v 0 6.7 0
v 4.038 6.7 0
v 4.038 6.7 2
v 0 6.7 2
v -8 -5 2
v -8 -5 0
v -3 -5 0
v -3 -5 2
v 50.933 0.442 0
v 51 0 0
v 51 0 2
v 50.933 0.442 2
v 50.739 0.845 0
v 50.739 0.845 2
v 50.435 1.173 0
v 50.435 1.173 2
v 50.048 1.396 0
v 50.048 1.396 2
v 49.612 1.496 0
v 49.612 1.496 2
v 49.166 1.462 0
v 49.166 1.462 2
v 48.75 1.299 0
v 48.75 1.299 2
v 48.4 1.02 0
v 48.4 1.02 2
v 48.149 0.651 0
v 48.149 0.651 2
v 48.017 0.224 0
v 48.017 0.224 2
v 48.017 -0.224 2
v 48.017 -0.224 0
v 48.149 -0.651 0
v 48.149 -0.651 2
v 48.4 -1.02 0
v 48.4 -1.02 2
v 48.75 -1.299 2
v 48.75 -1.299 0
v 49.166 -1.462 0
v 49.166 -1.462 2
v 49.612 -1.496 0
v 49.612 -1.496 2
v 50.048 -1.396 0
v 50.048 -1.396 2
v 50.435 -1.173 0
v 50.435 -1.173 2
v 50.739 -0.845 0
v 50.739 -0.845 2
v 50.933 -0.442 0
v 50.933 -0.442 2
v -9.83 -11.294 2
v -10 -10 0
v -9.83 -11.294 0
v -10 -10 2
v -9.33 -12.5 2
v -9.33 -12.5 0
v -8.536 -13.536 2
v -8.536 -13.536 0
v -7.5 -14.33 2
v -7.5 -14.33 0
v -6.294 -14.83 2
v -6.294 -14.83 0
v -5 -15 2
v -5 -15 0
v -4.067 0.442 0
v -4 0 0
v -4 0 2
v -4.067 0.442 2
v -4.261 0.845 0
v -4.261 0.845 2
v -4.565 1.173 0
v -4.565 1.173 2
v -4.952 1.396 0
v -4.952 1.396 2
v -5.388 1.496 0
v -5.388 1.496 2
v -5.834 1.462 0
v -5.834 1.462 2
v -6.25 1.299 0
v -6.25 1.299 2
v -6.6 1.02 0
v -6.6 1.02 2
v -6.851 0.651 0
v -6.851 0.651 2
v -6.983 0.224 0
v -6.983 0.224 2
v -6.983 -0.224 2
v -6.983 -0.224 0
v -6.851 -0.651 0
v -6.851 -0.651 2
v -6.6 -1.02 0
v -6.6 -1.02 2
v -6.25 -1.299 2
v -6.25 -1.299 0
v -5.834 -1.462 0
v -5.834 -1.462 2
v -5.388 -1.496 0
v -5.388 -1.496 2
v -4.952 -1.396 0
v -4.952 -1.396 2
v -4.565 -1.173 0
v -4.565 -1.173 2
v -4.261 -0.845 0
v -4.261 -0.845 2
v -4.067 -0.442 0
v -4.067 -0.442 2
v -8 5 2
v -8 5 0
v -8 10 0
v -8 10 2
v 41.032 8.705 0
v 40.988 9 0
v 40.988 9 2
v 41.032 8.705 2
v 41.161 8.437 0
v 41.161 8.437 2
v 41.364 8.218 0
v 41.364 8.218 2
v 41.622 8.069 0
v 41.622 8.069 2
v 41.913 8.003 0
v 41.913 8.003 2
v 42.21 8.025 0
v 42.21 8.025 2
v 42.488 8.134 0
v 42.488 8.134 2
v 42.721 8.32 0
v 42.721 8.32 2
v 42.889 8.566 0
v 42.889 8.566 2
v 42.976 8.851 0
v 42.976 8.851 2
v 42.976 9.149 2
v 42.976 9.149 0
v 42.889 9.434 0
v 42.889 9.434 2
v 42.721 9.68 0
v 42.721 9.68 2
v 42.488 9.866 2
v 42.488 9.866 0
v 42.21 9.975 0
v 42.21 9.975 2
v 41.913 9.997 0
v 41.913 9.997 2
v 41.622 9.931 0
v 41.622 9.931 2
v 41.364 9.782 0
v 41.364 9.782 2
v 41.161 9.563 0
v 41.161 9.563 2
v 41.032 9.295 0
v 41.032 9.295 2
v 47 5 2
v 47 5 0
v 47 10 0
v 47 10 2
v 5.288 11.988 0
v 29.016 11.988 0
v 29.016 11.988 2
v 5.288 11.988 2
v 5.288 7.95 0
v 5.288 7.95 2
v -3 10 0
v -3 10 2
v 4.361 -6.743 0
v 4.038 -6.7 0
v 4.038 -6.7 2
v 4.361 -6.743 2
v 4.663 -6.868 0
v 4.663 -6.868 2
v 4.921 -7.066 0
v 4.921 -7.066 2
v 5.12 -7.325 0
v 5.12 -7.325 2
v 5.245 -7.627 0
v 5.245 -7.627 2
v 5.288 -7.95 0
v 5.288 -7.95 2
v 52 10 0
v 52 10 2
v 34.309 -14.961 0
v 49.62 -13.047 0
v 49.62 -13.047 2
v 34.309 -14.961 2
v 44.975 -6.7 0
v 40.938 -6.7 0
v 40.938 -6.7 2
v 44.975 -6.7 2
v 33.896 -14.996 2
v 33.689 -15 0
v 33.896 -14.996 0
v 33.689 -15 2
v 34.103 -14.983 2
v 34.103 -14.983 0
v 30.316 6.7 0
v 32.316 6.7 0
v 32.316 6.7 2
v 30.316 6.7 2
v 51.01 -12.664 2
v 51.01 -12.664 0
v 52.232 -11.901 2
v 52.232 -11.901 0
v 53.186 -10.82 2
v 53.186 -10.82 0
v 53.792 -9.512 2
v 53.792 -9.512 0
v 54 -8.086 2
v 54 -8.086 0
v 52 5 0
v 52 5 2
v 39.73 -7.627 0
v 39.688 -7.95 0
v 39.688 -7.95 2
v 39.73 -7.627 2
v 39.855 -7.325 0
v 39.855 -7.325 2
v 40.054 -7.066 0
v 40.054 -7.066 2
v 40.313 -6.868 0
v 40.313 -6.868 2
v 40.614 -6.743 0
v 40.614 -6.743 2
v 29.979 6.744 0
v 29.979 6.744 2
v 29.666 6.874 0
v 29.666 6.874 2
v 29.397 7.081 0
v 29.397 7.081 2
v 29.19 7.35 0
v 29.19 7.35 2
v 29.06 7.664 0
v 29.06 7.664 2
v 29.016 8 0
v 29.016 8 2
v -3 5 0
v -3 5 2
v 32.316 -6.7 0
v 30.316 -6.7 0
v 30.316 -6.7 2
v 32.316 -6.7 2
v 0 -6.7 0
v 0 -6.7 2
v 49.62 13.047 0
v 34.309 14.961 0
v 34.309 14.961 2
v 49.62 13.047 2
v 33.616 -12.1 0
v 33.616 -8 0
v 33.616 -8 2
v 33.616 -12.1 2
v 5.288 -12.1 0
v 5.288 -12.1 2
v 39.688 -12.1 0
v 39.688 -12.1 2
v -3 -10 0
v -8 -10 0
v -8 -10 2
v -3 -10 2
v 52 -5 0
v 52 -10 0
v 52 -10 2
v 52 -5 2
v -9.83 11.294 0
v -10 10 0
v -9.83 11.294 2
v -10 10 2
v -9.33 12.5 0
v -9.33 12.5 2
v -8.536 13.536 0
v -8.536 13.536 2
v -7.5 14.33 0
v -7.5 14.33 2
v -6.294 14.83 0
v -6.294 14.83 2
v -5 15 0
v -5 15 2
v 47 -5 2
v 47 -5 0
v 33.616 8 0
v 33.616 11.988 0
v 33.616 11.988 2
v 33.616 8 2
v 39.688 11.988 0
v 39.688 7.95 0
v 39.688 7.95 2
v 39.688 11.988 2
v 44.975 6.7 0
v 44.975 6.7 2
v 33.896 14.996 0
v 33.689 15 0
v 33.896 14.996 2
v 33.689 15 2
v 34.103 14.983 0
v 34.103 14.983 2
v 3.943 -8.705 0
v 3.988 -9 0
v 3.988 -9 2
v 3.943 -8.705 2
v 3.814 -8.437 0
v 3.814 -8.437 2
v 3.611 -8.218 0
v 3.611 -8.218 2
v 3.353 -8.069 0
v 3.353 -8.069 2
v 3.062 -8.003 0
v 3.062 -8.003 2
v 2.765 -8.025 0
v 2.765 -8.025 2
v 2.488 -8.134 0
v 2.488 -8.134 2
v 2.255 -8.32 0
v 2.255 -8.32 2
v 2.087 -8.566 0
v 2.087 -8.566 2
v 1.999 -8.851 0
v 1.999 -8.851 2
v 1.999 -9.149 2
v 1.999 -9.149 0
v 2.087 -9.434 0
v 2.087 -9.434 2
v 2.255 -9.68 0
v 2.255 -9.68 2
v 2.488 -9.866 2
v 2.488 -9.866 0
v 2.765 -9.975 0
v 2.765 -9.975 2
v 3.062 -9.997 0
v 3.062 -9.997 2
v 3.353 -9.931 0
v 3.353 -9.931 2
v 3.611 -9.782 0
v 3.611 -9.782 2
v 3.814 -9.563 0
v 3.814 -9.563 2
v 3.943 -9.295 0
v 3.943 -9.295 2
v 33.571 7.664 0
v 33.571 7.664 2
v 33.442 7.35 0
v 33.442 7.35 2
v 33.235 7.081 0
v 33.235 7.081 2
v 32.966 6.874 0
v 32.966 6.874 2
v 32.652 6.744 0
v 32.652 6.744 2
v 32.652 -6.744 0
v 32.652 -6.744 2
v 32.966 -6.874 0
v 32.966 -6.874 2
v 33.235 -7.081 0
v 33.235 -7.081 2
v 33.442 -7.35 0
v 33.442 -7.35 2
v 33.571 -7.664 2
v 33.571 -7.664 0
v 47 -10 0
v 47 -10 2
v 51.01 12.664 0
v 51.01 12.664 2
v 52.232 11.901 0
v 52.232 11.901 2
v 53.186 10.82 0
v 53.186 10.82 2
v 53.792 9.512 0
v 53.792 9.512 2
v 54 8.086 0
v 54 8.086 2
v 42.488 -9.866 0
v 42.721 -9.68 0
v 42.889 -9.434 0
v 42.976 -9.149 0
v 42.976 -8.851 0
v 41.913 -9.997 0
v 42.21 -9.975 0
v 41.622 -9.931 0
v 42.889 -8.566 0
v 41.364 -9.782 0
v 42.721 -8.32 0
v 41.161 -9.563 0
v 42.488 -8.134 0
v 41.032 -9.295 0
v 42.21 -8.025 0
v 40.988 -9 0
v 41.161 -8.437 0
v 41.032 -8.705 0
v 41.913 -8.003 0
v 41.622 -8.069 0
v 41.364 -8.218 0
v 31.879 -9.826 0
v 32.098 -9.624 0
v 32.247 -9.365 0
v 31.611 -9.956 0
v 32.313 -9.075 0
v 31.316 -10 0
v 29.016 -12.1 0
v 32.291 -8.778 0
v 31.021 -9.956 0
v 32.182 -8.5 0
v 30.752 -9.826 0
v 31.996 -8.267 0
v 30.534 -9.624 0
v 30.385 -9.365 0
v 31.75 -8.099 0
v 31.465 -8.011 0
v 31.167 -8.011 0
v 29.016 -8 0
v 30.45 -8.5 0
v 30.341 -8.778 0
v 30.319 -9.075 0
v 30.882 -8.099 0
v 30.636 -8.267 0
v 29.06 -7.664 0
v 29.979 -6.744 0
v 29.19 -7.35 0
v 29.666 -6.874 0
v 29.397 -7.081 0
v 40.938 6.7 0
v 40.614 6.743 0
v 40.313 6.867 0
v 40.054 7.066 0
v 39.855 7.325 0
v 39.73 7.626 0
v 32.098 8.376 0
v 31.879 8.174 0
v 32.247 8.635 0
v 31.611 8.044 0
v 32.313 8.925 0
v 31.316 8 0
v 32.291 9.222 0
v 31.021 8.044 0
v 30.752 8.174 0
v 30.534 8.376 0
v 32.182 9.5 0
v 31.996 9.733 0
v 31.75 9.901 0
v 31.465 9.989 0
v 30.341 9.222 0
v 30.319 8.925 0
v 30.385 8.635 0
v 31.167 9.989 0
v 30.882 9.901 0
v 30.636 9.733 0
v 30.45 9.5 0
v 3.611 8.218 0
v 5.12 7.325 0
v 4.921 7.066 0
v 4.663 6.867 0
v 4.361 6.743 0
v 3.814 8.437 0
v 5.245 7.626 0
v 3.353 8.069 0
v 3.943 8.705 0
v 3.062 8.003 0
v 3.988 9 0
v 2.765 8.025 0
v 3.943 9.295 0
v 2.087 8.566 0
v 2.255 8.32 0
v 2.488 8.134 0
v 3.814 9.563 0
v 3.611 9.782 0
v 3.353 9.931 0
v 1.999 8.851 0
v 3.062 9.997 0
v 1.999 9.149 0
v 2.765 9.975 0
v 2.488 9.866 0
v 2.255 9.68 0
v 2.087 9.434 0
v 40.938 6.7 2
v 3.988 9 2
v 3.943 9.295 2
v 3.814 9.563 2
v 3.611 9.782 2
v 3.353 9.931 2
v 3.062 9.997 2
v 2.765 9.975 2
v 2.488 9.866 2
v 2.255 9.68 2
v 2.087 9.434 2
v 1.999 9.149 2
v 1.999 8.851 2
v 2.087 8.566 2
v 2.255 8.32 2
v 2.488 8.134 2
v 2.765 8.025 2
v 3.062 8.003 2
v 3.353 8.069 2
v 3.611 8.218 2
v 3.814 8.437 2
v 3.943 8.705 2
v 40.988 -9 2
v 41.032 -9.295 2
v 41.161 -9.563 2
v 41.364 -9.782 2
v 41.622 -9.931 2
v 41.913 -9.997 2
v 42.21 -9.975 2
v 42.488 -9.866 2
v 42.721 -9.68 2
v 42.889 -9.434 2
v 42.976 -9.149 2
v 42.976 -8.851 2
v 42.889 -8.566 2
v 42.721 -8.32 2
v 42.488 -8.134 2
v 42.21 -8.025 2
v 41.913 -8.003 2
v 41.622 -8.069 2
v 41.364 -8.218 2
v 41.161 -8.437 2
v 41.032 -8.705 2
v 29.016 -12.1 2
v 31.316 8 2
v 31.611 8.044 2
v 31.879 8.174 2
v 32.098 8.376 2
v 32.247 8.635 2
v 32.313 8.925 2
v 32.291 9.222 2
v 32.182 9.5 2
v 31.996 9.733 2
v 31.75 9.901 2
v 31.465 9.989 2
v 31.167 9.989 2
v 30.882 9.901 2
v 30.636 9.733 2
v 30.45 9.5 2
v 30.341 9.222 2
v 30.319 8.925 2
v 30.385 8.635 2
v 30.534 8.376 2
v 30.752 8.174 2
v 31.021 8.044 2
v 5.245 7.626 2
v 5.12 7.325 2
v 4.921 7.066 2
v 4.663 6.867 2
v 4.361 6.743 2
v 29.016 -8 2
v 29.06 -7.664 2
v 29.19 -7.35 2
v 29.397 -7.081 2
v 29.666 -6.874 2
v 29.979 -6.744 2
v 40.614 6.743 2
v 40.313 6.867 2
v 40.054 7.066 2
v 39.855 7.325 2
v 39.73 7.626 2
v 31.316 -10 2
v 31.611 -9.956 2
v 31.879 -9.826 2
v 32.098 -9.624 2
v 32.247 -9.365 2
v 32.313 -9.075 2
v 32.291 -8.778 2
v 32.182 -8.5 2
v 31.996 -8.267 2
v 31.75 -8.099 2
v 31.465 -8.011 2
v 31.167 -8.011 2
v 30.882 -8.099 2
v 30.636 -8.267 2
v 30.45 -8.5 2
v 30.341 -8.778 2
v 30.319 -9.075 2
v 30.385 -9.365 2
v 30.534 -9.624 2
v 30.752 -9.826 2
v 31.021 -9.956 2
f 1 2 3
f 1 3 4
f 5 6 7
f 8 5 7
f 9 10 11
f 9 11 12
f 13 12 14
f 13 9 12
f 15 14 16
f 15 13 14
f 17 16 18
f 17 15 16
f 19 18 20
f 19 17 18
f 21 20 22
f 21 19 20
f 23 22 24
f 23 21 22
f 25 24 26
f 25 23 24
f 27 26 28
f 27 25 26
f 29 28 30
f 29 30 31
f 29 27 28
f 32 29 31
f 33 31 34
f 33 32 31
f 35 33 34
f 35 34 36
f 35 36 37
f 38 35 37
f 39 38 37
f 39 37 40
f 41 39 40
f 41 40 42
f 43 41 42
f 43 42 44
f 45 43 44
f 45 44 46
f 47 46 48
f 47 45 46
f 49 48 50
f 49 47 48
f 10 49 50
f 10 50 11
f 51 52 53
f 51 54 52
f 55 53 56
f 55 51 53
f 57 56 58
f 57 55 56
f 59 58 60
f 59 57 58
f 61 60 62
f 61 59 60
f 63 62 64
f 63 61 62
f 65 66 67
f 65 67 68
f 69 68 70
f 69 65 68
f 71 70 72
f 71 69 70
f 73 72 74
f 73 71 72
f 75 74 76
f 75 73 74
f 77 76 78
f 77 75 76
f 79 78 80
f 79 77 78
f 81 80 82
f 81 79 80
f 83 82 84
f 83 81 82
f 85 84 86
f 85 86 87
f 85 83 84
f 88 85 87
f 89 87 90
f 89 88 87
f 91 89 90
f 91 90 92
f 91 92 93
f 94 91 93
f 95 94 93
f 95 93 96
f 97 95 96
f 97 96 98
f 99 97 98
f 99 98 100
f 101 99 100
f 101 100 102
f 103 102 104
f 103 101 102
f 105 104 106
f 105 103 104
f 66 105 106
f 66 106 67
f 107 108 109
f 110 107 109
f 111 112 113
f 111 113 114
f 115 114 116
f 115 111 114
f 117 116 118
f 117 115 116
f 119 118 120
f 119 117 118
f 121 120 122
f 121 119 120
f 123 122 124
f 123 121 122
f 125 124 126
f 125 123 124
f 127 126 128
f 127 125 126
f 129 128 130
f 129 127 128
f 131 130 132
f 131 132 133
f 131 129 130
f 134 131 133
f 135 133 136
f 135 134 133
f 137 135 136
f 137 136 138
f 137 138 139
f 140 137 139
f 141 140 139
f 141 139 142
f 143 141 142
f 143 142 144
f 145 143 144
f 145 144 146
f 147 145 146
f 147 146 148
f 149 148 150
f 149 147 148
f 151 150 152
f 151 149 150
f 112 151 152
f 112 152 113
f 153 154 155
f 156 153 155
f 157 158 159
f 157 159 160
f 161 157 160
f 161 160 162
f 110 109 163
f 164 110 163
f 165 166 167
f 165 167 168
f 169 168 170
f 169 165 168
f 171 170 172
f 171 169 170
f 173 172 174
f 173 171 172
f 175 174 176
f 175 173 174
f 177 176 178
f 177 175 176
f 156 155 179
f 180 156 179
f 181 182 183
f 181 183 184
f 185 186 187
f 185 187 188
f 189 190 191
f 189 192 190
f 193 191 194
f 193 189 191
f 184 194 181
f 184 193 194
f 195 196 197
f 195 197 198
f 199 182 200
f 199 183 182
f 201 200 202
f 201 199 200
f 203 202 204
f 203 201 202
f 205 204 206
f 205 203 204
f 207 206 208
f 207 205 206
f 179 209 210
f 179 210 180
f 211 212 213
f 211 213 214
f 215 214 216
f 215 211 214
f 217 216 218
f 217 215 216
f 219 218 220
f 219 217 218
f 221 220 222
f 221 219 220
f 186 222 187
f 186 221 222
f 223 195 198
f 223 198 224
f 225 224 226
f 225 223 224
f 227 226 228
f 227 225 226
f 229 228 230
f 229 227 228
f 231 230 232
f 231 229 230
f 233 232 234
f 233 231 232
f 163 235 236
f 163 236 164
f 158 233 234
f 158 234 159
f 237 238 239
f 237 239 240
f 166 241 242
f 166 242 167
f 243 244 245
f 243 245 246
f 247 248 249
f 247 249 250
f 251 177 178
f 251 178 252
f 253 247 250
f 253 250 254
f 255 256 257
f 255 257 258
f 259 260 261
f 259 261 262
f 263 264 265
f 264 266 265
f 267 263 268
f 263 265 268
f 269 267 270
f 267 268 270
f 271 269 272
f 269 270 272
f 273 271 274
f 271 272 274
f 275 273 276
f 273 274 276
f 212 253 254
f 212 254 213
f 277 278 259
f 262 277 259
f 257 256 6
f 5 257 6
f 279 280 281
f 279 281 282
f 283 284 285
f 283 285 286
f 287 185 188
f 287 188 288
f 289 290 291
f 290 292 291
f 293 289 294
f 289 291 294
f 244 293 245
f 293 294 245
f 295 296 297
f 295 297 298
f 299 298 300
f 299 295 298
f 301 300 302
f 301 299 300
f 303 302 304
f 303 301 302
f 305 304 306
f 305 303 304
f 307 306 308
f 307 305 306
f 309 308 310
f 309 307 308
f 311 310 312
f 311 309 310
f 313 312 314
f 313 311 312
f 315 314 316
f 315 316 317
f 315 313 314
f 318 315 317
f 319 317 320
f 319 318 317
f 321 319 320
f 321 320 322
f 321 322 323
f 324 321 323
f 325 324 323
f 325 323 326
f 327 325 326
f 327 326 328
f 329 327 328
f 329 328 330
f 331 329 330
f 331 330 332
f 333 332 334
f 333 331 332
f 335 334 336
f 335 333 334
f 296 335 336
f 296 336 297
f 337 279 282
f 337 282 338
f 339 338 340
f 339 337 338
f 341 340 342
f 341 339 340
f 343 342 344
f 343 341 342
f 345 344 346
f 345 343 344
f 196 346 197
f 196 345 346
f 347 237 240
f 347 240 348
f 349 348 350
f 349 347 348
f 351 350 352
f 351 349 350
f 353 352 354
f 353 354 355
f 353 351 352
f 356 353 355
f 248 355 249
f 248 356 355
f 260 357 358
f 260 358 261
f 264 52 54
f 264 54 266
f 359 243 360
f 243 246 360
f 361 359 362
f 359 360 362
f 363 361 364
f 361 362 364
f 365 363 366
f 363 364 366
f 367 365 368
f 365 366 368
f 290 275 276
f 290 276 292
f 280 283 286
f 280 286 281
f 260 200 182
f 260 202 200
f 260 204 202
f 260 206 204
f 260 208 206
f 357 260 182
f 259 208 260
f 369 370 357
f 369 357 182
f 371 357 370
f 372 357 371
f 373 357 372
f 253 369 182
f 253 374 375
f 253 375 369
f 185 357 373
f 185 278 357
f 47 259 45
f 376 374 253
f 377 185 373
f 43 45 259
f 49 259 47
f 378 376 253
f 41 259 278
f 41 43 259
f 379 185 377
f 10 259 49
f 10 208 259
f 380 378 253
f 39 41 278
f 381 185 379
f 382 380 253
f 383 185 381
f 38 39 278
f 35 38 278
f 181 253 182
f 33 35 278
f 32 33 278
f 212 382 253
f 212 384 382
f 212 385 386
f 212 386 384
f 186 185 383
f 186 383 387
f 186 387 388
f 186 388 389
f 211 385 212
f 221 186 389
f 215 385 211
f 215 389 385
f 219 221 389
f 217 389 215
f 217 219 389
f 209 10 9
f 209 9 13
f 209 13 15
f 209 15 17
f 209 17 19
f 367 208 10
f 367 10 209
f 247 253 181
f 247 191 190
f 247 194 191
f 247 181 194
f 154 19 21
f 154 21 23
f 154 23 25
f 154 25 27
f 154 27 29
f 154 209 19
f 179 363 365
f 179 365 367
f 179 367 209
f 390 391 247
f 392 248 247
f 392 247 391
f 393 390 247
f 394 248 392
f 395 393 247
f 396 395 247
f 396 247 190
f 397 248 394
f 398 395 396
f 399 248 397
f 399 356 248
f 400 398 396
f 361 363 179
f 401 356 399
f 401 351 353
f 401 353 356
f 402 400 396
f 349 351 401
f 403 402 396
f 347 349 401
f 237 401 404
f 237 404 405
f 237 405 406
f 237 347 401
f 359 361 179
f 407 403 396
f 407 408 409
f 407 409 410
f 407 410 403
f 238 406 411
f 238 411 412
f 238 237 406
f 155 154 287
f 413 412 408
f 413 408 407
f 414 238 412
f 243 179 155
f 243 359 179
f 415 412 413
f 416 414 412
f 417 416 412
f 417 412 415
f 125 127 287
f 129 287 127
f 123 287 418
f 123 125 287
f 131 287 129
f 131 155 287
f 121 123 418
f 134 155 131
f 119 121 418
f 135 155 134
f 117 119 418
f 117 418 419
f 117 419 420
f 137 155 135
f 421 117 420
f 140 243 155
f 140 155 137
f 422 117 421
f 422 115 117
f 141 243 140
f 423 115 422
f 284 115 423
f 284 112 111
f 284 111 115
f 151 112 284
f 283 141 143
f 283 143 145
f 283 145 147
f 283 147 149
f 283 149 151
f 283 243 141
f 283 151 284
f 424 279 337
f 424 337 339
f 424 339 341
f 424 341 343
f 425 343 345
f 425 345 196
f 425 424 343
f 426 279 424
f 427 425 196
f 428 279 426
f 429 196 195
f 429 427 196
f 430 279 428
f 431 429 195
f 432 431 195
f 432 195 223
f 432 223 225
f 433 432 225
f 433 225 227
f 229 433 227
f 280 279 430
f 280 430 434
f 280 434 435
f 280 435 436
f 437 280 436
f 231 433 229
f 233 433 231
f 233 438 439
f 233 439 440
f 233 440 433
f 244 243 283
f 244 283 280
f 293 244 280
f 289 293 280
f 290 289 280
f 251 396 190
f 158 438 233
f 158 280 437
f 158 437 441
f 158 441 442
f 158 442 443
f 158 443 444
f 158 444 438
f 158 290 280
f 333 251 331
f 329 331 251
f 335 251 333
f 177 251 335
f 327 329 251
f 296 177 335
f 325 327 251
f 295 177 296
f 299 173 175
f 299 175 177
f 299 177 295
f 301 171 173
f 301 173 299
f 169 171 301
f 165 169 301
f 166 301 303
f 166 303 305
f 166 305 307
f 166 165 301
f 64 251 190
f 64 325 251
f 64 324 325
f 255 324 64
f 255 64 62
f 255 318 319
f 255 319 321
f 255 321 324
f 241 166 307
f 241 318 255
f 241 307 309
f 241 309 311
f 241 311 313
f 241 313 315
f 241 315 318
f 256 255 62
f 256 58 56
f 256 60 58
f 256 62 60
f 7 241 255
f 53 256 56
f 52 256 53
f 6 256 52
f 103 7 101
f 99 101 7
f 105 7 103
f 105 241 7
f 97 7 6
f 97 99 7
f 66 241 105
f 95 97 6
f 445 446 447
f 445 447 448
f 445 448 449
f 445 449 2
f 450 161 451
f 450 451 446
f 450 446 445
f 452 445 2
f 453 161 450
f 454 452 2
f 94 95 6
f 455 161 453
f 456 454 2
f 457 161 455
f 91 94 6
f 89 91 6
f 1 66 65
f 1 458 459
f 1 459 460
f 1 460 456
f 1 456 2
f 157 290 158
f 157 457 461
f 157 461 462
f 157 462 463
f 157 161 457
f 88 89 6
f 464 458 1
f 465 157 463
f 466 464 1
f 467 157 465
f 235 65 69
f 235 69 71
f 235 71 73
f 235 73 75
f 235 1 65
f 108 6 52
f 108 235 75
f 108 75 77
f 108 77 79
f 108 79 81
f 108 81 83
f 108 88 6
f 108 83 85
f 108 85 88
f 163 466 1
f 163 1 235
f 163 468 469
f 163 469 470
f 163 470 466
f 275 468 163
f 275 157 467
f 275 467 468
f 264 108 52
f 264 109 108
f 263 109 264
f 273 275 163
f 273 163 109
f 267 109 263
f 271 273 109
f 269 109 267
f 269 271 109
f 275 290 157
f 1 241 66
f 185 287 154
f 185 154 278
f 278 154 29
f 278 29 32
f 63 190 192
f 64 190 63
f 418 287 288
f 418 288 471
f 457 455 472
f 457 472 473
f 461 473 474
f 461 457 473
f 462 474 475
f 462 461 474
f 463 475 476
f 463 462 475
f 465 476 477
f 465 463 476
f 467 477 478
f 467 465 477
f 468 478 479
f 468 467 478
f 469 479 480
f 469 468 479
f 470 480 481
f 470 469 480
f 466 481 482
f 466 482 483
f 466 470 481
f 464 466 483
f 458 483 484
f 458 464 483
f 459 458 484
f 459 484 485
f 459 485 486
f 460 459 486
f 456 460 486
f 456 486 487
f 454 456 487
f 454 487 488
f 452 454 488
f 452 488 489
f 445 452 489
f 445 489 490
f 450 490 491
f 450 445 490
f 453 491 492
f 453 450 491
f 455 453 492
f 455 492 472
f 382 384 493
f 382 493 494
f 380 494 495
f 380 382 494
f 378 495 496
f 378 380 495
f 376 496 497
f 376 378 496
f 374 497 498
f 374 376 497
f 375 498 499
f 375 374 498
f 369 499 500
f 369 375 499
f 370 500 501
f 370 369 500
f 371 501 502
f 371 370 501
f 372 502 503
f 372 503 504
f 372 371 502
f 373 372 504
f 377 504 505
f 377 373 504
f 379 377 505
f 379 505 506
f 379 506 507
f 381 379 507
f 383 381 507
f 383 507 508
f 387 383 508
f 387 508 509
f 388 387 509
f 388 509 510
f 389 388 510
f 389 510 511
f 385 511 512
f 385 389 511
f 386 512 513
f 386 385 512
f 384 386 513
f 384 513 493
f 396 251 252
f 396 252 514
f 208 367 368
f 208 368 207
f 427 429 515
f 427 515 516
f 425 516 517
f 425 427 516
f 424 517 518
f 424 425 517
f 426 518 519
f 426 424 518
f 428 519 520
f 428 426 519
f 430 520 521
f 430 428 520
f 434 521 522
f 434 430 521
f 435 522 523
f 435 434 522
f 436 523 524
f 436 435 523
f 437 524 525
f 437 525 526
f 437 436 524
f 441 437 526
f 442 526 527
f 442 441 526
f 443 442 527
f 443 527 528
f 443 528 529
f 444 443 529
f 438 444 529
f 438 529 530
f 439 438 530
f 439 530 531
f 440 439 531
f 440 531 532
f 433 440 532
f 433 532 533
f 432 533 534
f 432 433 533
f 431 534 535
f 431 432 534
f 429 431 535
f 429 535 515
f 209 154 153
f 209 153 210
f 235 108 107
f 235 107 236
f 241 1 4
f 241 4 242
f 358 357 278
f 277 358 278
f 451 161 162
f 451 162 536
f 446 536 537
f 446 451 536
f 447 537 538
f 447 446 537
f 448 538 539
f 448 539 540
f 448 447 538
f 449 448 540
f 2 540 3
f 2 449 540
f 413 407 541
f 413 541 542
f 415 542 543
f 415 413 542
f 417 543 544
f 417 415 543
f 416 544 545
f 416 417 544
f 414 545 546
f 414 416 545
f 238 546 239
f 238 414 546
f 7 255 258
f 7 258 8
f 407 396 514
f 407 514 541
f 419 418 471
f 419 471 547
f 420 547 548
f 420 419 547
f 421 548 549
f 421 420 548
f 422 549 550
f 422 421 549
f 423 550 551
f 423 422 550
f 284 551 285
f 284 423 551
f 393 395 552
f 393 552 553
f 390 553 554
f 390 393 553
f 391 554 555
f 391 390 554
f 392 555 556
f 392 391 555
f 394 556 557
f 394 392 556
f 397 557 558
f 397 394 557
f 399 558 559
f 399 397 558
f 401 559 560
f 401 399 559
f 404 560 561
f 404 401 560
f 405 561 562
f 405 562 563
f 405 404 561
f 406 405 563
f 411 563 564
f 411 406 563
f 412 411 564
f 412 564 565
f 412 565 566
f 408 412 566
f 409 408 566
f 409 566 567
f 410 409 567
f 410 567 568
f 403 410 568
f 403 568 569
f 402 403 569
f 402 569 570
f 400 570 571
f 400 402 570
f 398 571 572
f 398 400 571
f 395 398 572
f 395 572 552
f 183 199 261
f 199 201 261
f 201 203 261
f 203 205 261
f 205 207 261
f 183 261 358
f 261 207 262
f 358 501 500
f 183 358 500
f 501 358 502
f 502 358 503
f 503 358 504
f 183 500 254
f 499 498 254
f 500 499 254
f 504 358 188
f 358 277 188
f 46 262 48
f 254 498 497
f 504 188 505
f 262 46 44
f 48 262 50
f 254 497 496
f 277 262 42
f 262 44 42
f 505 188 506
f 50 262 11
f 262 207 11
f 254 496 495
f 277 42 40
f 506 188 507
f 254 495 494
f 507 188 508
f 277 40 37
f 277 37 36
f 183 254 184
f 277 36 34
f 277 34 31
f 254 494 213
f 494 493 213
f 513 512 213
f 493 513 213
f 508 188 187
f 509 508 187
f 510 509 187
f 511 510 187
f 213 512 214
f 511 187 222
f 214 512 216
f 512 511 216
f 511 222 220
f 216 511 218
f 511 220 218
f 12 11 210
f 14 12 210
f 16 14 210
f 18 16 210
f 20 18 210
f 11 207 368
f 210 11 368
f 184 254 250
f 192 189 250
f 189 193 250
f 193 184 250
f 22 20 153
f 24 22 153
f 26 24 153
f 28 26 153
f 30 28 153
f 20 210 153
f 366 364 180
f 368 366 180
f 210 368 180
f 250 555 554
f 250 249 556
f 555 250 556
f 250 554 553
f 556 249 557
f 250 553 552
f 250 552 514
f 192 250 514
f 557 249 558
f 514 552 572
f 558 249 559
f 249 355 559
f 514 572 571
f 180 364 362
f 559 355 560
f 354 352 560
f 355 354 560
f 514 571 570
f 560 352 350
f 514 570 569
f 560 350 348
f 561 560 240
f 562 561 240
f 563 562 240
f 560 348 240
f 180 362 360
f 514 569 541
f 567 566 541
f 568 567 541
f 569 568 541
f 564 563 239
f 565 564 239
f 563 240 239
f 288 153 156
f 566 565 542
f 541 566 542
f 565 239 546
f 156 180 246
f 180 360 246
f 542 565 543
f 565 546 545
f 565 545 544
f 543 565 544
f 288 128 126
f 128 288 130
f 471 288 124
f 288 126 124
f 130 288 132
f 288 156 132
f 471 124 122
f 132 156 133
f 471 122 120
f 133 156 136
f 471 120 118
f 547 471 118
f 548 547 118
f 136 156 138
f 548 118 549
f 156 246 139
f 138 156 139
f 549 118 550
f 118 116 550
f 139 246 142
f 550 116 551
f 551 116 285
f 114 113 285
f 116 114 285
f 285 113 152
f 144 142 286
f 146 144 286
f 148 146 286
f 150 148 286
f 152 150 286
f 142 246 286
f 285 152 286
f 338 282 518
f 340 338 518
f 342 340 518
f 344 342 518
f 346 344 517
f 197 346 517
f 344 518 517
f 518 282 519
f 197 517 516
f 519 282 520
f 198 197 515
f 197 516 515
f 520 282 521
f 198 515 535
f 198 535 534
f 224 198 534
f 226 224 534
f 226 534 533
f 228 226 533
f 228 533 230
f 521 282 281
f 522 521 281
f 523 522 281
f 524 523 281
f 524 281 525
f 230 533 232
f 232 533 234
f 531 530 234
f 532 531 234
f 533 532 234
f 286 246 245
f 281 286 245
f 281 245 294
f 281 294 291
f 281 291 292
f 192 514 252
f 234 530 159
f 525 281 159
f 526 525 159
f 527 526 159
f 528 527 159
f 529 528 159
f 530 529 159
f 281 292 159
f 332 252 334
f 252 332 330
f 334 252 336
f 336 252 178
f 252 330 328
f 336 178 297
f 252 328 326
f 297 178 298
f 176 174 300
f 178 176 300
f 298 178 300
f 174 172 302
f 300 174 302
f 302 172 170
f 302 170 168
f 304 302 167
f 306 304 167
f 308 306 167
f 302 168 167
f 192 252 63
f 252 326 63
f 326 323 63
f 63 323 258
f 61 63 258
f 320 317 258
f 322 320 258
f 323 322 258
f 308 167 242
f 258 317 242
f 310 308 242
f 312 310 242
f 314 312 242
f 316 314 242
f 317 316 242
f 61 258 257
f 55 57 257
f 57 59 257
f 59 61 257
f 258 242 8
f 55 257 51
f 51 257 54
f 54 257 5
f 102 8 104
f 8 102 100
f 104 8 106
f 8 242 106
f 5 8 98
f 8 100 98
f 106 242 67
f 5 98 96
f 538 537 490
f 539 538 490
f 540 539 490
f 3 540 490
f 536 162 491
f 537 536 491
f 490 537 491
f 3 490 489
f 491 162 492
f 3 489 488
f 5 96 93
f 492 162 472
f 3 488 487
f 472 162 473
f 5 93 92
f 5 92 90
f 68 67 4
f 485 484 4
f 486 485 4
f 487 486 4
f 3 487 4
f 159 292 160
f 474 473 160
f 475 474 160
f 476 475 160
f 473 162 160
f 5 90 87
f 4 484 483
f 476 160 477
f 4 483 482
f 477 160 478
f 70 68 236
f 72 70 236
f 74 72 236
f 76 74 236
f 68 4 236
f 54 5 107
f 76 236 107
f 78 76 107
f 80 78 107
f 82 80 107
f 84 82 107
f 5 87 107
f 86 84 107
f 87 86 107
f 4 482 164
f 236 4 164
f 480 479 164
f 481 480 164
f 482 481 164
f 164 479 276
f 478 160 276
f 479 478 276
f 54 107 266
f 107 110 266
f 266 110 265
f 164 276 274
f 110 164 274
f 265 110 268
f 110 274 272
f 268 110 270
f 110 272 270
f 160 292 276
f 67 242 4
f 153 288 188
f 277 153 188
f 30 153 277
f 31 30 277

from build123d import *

# Parameters (mm, degrees)
ESQUISSE1_R        = 1.5
ESQUISSE1_W        = 5
ESQUISSE1_H        = 5
BOSS_EXTRU_1_DEPTH = 2
FILLET1_R          = 5


with BuildPart() as part:
    # Esquisse1 → Boss.-Extru.1 (new body)
    with BuildSketch(Plane.XY):
        Polygon((-10, -15), (-10, 15), (34, 15), (54, 12.5), (54, -12.5), (34, -15), align=None)
        with Locations((-5.5, 0)):
            Circle(ESQUISSE1_R, mode=Mode.SUBTRACT)
        with Locations((49.5, 0)):
            Circle(ESQUISSE1_R, mode=Mode.SUBTRACT)
        with BuildLine():
            Line((4.03758425, 6.699965485), (0, 6.699965485))
            Line((0, 6.699965485), (0, -6.699965485))
            Line((0, -6.699965485), (4.037591434, -6.700034515))
            ThreePointArc((4.037591434, -6.700034515), (4.921479782, -7.066148374), (5.28759897, -7.950034515))
            Line((5.28759897, -7.950034515), (5.28759897, -12.100034515))
            Line((5.28759897, -12.100034515), (29.015776303, -12.100034515))
            Line((29.015776303, -12.100034515), (29.015776303, -8.000038733))
            ThreePointArc((29.015776303, -8.000038733), (29.396536008, -7.080797161), (30.315776345, -6.700034473))
            Line((30.315776345, -6.700034473), (32.315776344, -6.700034473))
            ThreePointArc((32.315776344, -6.700034473), (33.23501504, -7.080795537), (33.615776345, -8.000034132))
            Line((33.615776345, -8.000034132), (33.615776345, -12.100034515))
            Line((33.615776345, -12.100034515), (39.687598777, -12.100034515))
            Line((39.687598777, -12.100034515), (39.687598777, -7.950039613))
            ThreePointArc((39.687598777, -7.950039613), (40.053713738, -7.066152541), (40.937599481, -6.70003437))
            Line((40.937599481, -6.70003437), (44.975197892, -6.70003437))
            Line((44.975197892, -6.70003437), (44.975197892, 6.699965437))
            Line((44.975197892, 6.699965437), (40.9376034, 6.699965437))
            ThreePointArc((40.9376034, 6.699965437), (40.053716981, 7.066080502), (39.68759897, 7.949965701))
            Line((39.68759897, 7.949965701), (39.68759897, 11.987564455))
            Line((39.68759897, 11.987564455), (33.615776432, 11.987564455))
            Line((33.615776432, 11.987564455), (33.615776432, 7.999969389))
            ThreePointArc((33.615776432, 7.999969389), (33.235016597, 7.080728053), (32.315776389, 6.699965495))
            Line((32.315776389, 6.699965495), (30.31577639, 6.699965495))
            ThreePointArc((30.31577639, 6.699965495), (29.396537621, 7.080726637), (29.015776399, 7.999965373))
            Line((29.015776399, 7.999965373), (29.015776399, 11.987564455))
            Line((29.015776399, 11.987564455), (5.28759897, 11.987564455))
            Line((5.28759897, 11.987564455), (5.28759897, 7.949965485))
            ThreePointArc((5.28759897, 7.949965485), (4.921477242, 7.066076805), (4.03758425, 6.699965485))
        make_face(mode=Mode.SUBTRACT)
        with BuildLine():
            ThreePointArc((31.315776387, 9.999965485), (30.315776387, 8.999965485), (31.315776387, 7.999965485))
            ThreePointArc((31.315776387, 7.999965485), (32.315776387, 8.999965485), (31.315776387, 9.999965485))
        make_face(mode=Mode.SUBTRACT)
        with BuildLine():
            ThreePointArc((42.98759897, 8.999965485), (41.98759897, 9.999965485), (40.98759897, 8.999965485))
            ThreePointArc((40.98759897, 8.999965485), (41.98759897, 7.999965485), (42.98759897, 8.999965485))
        make_face(mode=Mode.SUBTRACT)
        with BuildLine():
            ThreePointArc((42.98759897, -9.000034515), (41.98759897, -8.000034515), (40.98759897, -9.000034515))
            ThreePointArc((40.98759897, -9.000034515), (41.98759897, -10.000034515), (42.98759897, -9.000034515))
        make_face(mode=Mode.SUBTRACT)
        with BuildLine():
            ThreePointArc((31.315776387, -8.000034515), (30.315776387, -9.000034515), (31.315776387, -10.000034515))
            ThreePointArc((31.315776387, -10.000034515), (32.315776387, -9.000034515), (31.315776387, -8.000034515))
        make_face(mode=Mode.SUBTRACT)
        with BuildLine():
            ThreePointArc((1.98759897, -9.000034515), (2.98759897, -10.000034515), (3.98759897, -9.000034515))
            ThreePointArc((3.98759897, -9.000034515), (2.98759897, -8.000034515), (1.98759897, -9.000034515))
        make_face(mode=Mode.SUBTRACT)
        with BuildLine():
            ThreePointArc((1.98759897, 8.999965485), (2.98759897, 7.999965485), (3.98759897, 8.999965485))
            ThreePointArc((3.98759897, 8.999965485), (2.98759897, 9.999965485), (1.98759897, 8.999965485))
        make_face(mode=Mode.SUBTRACT)
        with Locations((-5.5, 7.5)):
            Rectangle(ESQUISSE1_W, ESQUISSE1_H, mode=Mode.SUBTRACT)
        with Locations((-5.5, -7.5)):
            Rectangle(ESQUISSE1_W, ESQUISSE1_H, mode=Mode.SUBTRACT)
        with Locations((49.5, 7.5)):
            Rectangle(ESQUISSE1_W, ESQUISSE1_H, mode=Mode.SUBTRACT)
        with Locations((49.5, -7.5)):
            Rectangle(ESQUISSE1_W, ESQUISSE1_H, mode=Mode.SUBTRACT)
    extrude(amount=BOSS_EXTRU_1_DEPTH)

    # Fillet1
    fillet1_edges = [part.edges().sort_by_distance(p)[0] for p in [
        (-10, -15, 1),
        (-10, 15, 1),
        (34, 15, 1),
        (54, 12.5, 1),
        (54, -12.5, 1),
        (34, -15, 1),
    ]]
    fillet(fillet1_edges, radius=FILLET1_R)


solid = part.part
